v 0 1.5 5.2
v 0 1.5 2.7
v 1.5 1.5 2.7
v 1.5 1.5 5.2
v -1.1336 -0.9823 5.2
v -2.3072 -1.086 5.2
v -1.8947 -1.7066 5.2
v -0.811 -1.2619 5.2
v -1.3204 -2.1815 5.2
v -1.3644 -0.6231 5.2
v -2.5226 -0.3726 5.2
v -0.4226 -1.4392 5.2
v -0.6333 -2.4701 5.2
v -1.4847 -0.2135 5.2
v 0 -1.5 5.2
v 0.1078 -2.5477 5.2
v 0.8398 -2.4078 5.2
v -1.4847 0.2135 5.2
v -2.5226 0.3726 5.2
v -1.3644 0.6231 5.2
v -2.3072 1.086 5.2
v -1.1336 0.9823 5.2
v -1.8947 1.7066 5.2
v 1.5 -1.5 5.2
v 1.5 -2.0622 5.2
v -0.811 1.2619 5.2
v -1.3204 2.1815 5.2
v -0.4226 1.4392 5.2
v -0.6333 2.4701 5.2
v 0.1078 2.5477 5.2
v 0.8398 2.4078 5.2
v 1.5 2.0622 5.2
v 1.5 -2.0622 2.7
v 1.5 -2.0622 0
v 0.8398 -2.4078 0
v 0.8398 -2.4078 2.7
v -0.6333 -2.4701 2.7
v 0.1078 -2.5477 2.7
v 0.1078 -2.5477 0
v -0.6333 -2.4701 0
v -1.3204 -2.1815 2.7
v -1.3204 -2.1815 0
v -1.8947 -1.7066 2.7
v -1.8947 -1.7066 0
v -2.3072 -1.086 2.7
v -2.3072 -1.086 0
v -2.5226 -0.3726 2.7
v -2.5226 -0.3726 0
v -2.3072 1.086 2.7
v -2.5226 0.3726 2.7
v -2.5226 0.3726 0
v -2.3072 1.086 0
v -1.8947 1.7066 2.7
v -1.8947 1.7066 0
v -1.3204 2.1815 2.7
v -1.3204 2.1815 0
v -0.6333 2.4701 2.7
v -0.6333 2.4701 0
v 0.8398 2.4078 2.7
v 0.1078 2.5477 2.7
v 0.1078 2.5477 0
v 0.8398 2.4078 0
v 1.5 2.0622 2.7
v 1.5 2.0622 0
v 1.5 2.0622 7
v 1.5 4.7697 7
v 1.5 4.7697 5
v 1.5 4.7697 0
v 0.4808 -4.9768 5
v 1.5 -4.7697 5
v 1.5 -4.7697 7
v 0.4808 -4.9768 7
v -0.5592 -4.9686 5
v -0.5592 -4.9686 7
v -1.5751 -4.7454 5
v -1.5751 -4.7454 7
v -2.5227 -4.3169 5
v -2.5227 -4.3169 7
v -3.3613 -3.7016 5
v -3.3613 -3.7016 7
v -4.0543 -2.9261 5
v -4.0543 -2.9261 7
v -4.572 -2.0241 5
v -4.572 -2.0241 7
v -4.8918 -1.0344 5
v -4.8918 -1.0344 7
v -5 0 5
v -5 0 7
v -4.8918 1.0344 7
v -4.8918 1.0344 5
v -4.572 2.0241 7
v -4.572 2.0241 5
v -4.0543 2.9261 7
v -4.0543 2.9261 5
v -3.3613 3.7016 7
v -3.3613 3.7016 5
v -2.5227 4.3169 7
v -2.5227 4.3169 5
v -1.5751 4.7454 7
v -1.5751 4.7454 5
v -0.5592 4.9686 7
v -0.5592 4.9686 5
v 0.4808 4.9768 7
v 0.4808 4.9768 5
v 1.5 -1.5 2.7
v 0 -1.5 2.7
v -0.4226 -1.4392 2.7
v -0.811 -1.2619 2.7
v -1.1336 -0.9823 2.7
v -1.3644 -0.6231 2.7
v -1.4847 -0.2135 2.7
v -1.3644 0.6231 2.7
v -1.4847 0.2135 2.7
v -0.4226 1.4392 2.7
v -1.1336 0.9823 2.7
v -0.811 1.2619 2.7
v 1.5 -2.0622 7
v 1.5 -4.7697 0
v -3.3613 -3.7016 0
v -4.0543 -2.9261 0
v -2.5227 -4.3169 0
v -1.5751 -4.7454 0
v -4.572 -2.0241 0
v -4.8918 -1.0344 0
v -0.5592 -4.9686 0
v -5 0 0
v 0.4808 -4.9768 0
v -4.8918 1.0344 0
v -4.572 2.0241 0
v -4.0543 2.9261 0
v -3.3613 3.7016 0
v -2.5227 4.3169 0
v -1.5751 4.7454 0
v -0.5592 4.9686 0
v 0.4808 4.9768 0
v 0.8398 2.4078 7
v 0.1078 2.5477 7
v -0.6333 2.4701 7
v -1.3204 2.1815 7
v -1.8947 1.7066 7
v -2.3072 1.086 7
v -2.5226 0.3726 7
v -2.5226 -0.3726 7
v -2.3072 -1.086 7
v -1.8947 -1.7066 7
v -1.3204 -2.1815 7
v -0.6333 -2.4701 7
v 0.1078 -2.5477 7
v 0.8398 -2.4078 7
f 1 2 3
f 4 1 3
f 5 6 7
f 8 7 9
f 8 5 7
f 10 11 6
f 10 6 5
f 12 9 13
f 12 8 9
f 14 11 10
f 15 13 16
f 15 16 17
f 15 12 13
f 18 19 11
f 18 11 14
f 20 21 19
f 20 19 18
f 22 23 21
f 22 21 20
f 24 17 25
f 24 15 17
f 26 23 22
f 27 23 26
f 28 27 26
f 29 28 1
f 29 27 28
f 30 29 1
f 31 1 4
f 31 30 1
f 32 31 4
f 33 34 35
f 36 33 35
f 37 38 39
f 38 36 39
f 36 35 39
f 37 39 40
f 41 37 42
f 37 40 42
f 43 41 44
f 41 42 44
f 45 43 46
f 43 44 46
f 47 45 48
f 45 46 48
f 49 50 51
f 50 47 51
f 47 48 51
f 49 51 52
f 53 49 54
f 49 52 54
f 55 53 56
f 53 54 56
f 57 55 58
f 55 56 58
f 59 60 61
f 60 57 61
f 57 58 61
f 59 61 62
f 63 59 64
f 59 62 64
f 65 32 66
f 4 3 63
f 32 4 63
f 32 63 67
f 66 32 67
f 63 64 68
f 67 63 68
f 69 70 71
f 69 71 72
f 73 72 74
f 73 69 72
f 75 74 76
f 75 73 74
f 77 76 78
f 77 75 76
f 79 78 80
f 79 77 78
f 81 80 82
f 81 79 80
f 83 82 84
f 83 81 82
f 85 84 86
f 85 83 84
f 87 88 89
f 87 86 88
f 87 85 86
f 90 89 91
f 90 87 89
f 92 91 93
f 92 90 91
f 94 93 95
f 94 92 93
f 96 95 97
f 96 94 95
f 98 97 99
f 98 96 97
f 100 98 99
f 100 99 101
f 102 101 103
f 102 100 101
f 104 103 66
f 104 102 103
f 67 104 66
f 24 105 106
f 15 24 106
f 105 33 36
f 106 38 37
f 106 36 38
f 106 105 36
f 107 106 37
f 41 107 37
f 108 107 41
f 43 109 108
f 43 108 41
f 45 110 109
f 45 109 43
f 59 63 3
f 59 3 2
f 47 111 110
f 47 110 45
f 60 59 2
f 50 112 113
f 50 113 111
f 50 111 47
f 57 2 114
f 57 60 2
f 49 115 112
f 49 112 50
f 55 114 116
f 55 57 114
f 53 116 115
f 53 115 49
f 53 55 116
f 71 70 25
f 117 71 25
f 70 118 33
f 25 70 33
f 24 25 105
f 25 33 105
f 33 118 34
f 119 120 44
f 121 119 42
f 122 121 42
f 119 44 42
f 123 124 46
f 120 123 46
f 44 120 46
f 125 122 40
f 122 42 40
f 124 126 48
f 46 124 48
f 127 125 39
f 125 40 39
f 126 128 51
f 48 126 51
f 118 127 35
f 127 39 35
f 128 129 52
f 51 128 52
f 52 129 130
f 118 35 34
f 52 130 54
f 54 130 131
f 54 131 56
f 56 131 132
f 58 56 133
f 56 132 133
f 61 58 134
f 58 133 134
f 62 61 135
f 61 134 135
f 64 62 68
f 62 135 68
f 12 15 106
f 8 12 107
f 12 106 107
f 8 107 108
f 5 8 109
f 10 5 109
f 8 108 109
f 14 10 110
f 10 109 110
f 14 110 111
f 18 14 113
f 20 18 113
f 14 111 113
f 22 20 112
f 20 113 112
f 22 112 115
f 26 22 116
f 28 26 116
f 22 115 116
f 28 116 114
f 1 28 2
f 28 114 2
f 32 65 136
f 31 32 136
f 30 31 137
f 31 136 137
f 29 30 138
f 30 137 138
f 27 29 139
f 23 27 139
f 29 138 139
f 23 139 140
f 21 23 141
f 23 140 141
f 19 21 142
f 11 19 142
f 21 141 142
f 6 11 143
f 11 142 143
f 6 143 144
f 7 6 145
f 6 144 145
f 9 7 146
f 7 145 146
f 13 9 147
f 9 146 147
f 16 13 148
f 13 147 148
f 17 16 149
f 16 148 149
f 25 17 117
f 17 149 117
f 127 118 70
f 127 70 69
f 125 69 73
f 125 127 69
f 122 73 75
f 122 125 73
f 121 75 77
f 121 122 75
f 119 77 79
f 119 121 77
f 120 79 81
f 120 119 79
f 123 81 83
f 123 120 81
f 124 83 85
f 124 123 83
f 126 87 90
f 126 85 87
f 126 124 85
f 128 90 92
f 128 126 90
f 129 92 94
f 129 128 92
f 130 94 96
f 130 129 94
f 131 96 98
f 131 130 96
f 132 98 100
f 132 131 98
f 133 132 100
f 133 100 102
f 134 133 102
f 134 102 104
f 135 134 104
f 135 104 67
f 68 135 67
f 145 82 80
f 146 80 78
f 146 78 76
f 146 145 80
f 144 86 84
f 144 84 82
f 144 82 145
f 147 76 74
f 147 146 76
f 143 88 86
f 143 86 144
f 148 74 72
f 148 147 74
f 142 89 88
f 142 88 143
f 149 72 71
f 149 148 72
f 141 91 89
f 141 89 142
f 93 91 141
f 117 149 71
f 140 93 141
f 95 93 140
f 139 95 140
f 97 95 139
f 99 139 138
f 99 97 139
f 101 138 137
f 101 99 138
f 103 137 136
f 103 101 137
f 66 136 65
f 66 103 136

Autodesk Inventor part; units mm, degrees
ref_plane "YZ Plane" through (0, 0, 0) normal (1, 0, 0) x (0, 1, 0)
ref_plane "XZ Plane" through (0, 0, 0) normal (0, 1, 0) x (-1, 0, 0)
ref_plane "XY Plane" through (0, 0, 0) normal (0, 0, 1) x (1, 0, 0)
sketch "Sketch1" plane through (0, 0, 0) normal (0, 0, 1) x (1, 0, 0)
  circle A0 centre (0, 0) radius 5
  dimension "d0" = 10
extrude "Extrusion1" add sketch "Sketch1" along normal blind 5
sketch "Sketch2" plane through (0, 0, 5) normal (0, 0, 1) x (1, 0, 0)
  circle A0 centre (0, 0) radius 5 projected
  arc A1 (0, 1.5) -> (0, -1.5) centre (0, 0) ccw
  line L0 (0, 1.5) -> (4.7697, 1.5)
  line L1 (0, -1.5) -> (4.7697, -1.5)
  arc A2 (4.7697, -1.5) -> (4.7697, 1.5) centre (0, 0) ccw
  dimension "d3" = 3
extrude "Extrusion2" cut sketch "Sketch2" against normal through all contours A0 L1 A1 L0 picked at (1.6667, 0)
sketch "Sketch3" plane through (0, 0, 5) normal (0, 0, 1) x (1, 0, 0)
  arc A0 (0, 1.5) -> (0, -1.5) centre (0, 0) ccw projected
  line L0 (1.5, 5.5246) -> (5.604, 5.5246)
  line L1 (5.604, 5.5246) -> (5.604, -5.9981)
  line L2 (5.604, -5.9981) -> (1.5, -5.9981)
  line L3 (1.5, -5.9981) -> (1.5, 5.5246)
  dimension "d6" = 1.5
extrude "Extrusion3" cut sketch "Sketch3" against normal through all
sketch "Sketch4" plane through (0, 0, 0) normal (0, 0, -1) x (-1, 0, 0)
  arc A0 (0, -1.5) -> (0, 1.5) centre (0, 0) ccw projected
  circle A1 centre (0, 0) radius 2.55
  dimension "d9" = 5.1
extrude "Extrusion4" cut sketch "Sketch4" against normal blind 2.7
sketch "Sketch5" plane through (0, 0, 5) normal (0, 0, 1) x (1, 0, 0)
  line L0 (1.5, -4.7697) -> (1.5, -1.5) projected
  line L1 (1.5, -1.5) -> (0, -1.5) projected
  arc A0 (0, 1.5) -> (0, -1.5) centre (0, 0) ccw projected
  line L2 (0, 1.5) -> (1.5, 1.5) projected
  line L3 (1.5, 1.5) -> (1.5, 4.7697) projected
  arc A1 (1.5, 4.7697) -> (1.5, -4.7697) centre (0, 0) ccw projected
extrude "Extrusion5" add sketch "Sketch5" along normal blind 2
sketch "Sketch6" plane through (0, 0, 7) normal (0, 0, 1) x (1, 0, 0)
  arc A0 (1.5, 4.7697) -> (1.5, -4.7697) centre (0, 0) ccw projected
  circle A1 centre (0, 0) radius 2.55
  dimension "d18" = 5.1
extrude "Extrusion6" cut sketch "Sketch6" against normal blind 1.8
properties part number "Jig_Bearing_Asm_Holder"
